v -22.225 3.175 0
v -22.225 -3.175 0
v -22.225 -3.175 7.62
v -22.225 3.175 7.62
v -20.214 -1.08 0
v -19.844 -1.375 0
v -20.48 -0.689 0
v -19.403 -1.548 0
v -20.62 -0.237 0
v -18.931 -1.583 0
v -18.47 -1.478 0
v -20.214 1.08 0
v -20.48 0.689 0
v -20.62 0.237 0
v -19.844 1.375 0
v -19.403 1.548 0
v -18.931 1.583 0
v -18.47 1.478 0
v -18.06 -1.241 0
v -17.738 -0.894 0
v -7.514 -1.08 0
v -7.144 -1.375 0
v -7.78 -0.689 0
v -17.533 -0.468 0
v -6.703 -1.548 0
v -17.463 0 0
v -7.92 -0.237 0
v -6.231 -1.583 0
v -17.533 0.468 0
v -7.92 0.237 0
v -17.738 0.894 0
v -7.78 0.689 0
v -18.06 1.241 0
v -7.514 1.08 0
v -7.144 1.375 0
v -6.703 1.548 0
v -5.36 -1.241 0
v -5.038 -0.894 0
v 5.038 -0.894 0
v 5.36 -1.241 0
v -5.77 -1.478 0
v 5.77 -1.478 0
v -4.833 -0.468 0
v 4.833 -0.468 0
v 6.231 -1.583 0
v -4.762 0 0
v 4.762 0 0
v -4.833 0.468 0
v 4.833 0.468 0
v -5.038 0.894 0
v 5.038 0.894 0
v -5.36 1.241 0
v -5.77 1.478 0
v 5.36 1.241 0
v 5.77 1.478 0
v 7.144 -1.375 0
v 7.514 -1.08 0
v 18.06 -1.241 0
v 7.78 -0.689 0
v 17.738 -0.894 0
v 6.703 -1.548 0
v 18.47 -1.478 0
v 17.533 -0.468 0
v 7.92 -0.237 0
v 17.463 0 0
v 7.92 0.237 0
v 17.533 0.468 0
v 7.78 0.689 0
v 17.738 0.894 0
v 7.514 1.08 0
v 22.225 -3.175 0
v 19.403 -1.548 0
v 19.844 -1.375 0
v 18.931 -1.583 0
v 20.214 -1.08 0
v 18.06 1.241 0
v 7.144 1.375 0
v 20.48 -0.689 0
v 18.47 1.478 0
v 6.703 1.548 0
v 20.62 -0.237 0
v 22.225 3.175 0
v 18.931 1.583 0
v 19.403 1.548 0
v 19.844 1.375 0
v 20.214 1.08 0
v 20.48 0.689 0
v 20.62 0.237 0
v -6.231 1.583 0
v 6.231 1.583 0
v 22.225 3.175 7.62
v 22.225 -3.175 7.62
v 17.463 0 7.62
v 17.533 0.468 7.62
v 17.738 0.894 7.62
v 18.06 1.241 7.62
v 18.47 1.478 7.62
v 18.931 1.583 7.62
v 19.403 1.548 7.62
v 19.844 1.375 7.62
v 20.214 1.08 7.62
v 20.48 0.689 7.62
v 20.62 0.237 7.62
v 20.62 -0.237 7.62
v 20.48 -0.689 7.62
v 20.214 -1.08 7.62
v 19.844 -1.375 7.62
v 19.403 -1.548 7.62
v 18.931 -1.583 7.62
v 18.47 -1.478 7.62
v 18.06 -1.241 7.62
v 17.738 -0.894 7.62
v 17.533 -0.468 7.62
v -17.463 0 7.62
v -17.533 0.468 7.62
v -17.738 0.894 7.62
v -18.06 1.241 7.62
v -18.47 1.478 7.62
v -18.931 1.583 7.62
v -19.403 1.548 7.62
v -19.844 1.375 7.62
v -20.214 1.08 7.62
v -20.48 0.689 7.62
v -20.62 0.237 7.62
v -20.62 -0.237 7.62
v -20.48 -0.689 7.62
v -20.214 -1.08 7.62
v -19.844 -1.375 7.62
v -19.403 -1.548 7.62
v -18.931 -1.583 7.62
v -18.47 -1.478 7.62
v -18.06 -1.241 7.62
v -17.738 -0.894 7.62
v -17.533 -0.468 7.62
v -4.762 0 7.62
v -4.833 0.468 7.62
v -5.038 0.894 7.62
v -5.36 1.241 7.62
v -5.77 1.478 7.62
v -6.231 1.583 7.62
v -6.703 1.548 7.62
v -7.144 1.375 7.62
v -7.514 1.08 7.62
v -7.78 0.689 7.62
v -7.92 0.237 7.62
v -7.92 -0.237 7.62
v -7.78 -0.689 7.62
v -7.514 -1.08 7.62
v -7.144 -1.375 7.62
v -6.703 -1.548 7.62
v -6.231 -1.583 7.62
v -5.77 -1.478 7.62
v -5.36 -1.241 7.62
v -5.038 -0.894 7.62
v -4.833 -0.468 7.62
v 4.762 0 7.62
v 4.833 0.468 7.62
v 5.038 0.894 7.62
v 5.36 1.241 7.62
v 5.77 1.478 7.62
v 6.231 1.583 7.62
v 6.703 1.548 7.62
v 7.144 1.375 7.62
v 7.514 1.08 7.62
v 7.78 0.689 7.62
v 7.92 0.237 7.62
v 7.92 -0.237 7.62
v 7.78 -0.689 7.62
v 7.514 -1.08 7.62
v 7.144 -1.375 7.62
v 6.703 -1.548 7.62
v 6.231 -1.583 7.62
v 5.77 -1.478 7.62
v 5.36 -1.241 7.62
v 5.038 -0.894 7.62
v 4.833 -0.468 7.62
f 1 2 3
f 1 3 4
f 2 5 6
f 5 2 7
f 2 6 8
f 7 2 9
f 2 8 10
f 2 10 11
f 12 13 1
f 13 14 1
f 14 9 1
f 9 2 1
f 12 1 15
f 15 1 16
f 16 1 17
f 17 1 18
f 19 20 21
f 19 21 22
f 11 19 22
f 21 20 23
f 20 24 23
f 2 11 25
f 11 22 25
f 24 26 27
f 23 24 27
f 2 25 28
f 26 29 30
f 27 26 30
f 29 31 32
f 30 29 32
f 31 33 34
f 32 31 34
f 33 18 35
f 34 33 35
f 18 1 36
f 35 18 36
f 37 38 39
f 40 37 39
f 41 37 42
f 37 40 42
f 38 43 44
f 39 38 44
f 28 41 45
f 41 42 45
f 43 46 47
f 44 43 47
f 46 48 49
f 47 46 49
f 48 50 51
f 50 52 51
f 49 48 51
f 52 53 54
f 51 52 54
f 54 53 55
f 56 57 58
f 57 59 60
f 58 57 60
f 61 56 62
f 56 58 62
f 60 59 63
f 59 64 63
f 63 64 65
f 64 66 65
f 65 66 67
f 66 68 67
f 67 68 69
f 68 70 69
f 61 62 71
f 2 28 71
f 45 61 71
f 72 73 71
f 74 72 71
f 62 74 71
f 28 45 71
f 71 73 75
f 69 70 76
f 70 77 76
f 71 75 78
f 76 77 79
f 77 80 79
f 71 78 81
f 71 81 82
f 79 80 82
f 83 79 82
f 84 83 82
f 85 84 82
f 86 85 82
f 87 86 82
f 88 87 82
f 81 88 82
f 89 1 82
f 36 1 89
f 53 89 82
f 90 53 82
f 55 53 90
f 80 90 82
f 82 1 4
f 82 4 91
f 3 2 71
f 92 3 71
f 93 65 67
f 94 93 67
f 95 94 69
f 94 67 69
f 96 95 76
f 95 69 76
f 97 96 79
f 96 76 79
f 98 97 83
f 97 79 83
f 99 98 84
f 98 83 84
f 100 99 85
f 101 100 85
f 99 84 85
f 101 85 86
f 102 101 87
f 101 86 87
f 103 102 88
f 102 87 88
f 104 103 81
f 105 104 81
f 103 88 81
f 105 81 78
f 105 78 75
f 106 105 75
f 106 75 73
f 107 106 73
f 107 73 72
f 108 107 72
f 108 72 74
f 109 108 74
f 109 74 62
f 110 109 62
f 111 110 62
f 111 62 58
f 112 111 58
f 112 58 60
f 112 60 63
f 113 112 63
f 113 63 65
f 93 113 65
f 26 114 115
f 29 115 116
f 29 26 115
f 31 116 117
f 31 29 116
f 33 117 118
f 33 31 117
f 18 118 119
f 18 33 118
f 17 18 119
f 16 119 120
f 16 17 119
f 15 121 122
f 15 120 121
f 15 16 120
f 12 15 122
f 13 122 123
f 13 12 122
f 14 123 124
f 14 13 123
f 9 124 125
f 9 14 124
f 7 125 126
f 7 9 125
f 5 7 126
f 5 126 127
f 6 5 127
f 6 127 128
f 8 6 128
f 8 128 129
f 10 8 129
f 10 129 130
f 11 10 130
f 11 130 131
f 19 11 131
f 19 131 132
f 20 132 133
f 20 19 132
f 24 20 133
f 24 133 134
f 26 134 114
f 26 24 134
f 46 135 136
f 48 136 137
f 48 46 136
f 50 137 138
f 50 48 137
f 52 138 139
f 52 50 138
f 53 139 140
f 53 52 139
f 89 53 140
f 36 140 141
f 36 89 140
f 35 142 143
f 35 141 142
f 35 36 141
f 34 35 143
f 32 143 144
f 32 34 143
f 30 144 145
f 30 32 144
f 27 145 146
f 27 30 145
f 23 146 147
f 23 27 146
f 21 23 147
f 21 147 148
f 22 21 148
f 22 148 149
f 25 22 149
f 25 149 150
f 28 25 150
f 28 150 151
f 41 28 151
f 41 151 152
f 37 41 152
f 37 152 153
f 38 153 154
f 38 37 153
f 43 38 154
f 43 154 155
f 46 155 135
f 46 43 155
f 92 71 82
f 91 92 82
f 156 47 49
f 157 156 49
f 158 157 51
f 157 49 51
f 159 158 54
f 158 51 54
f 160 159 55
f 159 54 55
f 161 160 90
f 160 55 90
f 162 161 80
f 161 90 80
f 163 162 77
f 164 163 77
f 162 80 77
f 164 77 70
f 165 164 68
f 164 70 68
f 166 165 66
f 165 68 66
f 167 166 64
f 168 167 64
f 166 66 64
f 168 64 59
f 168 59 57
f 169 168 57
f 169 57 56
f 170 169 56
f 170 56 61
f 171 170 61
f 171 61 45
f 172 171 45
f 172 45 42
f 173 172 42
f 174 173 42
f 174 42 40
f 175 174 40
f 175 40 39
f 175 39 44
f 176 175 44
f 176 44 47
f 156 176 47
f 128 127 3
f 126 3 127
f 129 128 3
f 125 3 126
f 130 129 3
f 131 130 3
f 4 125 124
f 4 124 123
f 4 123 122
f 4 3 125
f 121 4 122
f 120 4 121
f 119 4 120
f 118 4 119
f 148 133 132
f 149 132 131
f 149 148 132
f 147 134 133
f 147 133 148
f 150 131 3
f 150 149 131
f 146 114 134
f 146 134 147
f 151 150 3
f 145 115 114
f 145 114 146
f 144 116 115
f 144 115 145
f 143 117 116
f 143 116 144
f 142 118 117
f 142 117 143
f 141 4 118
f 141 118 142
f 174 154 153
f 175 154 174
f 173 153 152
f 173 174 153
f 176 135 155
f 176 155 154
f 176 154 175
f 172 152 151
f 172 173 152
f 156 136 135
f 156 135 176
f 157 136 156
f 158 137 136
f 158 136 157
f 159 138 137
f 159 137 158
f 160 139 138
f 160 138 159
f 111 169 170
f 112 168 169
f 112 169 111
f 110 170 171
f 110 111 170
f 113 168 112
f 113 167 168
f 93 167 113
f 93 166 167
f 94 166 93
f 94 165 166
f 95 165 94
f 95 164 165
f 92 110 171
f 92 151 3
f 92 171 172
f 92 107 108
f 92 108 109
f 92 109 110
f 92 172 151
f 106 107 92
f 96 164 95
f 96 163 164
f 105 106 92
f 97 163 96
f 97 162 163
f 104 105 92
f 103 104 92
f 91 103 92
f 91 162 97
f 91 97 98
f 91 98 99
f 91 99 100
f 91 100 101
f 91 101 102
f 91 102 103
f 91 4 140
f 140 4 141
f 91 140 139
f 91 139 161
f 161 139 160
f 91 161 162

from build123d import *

# Parameters (mm, degrees)
SKETCH2_W           = 44.45
SKETCH2_H           = 6.35
BOSS_EXTRUDE1_DEPTH = 7.62
SKETCH4_R           = 1.5875
CUT_EXTRUDE2_DEPTH  = 8.62


with BuildPart() as part:
    # Sketch2 → Boss-Extrude1 (new body)
    with BuildSketch(Plane.XY):
        Rectangle(SKETCH2_W, SKETCH2_H)
    extrude(amount=BOSS_EXTRUDE1_DEPTH)

    # Sketch4 → Cut-Extrude2 (cut, through all)
    with BuildSketch(Plane(origin=(0, 0, 0), x_dir=(-1, 0, 0), z_dir=(0, 0, -1))):
        with Locations((-6.35, 0)):
            Circle(SKETCH4_R)
        with Locations((-19.05, 0)):
            Circle(SKETCH4_R)
    cut_extrude2 = extrude(amount=-CUT_EXTRUDE2_DEPTH, mode=Mode.SUBTRACT)

    # Mirror2: Cut-Extrude2 across plane
    add(cut_extrude2.mirror(Plane(origin=(0, 0, 0), x_dir=(0, 0, 1), z_dir=(1, 0, 0))), mode=Mode.SUBTRACT)


solid = part.part
